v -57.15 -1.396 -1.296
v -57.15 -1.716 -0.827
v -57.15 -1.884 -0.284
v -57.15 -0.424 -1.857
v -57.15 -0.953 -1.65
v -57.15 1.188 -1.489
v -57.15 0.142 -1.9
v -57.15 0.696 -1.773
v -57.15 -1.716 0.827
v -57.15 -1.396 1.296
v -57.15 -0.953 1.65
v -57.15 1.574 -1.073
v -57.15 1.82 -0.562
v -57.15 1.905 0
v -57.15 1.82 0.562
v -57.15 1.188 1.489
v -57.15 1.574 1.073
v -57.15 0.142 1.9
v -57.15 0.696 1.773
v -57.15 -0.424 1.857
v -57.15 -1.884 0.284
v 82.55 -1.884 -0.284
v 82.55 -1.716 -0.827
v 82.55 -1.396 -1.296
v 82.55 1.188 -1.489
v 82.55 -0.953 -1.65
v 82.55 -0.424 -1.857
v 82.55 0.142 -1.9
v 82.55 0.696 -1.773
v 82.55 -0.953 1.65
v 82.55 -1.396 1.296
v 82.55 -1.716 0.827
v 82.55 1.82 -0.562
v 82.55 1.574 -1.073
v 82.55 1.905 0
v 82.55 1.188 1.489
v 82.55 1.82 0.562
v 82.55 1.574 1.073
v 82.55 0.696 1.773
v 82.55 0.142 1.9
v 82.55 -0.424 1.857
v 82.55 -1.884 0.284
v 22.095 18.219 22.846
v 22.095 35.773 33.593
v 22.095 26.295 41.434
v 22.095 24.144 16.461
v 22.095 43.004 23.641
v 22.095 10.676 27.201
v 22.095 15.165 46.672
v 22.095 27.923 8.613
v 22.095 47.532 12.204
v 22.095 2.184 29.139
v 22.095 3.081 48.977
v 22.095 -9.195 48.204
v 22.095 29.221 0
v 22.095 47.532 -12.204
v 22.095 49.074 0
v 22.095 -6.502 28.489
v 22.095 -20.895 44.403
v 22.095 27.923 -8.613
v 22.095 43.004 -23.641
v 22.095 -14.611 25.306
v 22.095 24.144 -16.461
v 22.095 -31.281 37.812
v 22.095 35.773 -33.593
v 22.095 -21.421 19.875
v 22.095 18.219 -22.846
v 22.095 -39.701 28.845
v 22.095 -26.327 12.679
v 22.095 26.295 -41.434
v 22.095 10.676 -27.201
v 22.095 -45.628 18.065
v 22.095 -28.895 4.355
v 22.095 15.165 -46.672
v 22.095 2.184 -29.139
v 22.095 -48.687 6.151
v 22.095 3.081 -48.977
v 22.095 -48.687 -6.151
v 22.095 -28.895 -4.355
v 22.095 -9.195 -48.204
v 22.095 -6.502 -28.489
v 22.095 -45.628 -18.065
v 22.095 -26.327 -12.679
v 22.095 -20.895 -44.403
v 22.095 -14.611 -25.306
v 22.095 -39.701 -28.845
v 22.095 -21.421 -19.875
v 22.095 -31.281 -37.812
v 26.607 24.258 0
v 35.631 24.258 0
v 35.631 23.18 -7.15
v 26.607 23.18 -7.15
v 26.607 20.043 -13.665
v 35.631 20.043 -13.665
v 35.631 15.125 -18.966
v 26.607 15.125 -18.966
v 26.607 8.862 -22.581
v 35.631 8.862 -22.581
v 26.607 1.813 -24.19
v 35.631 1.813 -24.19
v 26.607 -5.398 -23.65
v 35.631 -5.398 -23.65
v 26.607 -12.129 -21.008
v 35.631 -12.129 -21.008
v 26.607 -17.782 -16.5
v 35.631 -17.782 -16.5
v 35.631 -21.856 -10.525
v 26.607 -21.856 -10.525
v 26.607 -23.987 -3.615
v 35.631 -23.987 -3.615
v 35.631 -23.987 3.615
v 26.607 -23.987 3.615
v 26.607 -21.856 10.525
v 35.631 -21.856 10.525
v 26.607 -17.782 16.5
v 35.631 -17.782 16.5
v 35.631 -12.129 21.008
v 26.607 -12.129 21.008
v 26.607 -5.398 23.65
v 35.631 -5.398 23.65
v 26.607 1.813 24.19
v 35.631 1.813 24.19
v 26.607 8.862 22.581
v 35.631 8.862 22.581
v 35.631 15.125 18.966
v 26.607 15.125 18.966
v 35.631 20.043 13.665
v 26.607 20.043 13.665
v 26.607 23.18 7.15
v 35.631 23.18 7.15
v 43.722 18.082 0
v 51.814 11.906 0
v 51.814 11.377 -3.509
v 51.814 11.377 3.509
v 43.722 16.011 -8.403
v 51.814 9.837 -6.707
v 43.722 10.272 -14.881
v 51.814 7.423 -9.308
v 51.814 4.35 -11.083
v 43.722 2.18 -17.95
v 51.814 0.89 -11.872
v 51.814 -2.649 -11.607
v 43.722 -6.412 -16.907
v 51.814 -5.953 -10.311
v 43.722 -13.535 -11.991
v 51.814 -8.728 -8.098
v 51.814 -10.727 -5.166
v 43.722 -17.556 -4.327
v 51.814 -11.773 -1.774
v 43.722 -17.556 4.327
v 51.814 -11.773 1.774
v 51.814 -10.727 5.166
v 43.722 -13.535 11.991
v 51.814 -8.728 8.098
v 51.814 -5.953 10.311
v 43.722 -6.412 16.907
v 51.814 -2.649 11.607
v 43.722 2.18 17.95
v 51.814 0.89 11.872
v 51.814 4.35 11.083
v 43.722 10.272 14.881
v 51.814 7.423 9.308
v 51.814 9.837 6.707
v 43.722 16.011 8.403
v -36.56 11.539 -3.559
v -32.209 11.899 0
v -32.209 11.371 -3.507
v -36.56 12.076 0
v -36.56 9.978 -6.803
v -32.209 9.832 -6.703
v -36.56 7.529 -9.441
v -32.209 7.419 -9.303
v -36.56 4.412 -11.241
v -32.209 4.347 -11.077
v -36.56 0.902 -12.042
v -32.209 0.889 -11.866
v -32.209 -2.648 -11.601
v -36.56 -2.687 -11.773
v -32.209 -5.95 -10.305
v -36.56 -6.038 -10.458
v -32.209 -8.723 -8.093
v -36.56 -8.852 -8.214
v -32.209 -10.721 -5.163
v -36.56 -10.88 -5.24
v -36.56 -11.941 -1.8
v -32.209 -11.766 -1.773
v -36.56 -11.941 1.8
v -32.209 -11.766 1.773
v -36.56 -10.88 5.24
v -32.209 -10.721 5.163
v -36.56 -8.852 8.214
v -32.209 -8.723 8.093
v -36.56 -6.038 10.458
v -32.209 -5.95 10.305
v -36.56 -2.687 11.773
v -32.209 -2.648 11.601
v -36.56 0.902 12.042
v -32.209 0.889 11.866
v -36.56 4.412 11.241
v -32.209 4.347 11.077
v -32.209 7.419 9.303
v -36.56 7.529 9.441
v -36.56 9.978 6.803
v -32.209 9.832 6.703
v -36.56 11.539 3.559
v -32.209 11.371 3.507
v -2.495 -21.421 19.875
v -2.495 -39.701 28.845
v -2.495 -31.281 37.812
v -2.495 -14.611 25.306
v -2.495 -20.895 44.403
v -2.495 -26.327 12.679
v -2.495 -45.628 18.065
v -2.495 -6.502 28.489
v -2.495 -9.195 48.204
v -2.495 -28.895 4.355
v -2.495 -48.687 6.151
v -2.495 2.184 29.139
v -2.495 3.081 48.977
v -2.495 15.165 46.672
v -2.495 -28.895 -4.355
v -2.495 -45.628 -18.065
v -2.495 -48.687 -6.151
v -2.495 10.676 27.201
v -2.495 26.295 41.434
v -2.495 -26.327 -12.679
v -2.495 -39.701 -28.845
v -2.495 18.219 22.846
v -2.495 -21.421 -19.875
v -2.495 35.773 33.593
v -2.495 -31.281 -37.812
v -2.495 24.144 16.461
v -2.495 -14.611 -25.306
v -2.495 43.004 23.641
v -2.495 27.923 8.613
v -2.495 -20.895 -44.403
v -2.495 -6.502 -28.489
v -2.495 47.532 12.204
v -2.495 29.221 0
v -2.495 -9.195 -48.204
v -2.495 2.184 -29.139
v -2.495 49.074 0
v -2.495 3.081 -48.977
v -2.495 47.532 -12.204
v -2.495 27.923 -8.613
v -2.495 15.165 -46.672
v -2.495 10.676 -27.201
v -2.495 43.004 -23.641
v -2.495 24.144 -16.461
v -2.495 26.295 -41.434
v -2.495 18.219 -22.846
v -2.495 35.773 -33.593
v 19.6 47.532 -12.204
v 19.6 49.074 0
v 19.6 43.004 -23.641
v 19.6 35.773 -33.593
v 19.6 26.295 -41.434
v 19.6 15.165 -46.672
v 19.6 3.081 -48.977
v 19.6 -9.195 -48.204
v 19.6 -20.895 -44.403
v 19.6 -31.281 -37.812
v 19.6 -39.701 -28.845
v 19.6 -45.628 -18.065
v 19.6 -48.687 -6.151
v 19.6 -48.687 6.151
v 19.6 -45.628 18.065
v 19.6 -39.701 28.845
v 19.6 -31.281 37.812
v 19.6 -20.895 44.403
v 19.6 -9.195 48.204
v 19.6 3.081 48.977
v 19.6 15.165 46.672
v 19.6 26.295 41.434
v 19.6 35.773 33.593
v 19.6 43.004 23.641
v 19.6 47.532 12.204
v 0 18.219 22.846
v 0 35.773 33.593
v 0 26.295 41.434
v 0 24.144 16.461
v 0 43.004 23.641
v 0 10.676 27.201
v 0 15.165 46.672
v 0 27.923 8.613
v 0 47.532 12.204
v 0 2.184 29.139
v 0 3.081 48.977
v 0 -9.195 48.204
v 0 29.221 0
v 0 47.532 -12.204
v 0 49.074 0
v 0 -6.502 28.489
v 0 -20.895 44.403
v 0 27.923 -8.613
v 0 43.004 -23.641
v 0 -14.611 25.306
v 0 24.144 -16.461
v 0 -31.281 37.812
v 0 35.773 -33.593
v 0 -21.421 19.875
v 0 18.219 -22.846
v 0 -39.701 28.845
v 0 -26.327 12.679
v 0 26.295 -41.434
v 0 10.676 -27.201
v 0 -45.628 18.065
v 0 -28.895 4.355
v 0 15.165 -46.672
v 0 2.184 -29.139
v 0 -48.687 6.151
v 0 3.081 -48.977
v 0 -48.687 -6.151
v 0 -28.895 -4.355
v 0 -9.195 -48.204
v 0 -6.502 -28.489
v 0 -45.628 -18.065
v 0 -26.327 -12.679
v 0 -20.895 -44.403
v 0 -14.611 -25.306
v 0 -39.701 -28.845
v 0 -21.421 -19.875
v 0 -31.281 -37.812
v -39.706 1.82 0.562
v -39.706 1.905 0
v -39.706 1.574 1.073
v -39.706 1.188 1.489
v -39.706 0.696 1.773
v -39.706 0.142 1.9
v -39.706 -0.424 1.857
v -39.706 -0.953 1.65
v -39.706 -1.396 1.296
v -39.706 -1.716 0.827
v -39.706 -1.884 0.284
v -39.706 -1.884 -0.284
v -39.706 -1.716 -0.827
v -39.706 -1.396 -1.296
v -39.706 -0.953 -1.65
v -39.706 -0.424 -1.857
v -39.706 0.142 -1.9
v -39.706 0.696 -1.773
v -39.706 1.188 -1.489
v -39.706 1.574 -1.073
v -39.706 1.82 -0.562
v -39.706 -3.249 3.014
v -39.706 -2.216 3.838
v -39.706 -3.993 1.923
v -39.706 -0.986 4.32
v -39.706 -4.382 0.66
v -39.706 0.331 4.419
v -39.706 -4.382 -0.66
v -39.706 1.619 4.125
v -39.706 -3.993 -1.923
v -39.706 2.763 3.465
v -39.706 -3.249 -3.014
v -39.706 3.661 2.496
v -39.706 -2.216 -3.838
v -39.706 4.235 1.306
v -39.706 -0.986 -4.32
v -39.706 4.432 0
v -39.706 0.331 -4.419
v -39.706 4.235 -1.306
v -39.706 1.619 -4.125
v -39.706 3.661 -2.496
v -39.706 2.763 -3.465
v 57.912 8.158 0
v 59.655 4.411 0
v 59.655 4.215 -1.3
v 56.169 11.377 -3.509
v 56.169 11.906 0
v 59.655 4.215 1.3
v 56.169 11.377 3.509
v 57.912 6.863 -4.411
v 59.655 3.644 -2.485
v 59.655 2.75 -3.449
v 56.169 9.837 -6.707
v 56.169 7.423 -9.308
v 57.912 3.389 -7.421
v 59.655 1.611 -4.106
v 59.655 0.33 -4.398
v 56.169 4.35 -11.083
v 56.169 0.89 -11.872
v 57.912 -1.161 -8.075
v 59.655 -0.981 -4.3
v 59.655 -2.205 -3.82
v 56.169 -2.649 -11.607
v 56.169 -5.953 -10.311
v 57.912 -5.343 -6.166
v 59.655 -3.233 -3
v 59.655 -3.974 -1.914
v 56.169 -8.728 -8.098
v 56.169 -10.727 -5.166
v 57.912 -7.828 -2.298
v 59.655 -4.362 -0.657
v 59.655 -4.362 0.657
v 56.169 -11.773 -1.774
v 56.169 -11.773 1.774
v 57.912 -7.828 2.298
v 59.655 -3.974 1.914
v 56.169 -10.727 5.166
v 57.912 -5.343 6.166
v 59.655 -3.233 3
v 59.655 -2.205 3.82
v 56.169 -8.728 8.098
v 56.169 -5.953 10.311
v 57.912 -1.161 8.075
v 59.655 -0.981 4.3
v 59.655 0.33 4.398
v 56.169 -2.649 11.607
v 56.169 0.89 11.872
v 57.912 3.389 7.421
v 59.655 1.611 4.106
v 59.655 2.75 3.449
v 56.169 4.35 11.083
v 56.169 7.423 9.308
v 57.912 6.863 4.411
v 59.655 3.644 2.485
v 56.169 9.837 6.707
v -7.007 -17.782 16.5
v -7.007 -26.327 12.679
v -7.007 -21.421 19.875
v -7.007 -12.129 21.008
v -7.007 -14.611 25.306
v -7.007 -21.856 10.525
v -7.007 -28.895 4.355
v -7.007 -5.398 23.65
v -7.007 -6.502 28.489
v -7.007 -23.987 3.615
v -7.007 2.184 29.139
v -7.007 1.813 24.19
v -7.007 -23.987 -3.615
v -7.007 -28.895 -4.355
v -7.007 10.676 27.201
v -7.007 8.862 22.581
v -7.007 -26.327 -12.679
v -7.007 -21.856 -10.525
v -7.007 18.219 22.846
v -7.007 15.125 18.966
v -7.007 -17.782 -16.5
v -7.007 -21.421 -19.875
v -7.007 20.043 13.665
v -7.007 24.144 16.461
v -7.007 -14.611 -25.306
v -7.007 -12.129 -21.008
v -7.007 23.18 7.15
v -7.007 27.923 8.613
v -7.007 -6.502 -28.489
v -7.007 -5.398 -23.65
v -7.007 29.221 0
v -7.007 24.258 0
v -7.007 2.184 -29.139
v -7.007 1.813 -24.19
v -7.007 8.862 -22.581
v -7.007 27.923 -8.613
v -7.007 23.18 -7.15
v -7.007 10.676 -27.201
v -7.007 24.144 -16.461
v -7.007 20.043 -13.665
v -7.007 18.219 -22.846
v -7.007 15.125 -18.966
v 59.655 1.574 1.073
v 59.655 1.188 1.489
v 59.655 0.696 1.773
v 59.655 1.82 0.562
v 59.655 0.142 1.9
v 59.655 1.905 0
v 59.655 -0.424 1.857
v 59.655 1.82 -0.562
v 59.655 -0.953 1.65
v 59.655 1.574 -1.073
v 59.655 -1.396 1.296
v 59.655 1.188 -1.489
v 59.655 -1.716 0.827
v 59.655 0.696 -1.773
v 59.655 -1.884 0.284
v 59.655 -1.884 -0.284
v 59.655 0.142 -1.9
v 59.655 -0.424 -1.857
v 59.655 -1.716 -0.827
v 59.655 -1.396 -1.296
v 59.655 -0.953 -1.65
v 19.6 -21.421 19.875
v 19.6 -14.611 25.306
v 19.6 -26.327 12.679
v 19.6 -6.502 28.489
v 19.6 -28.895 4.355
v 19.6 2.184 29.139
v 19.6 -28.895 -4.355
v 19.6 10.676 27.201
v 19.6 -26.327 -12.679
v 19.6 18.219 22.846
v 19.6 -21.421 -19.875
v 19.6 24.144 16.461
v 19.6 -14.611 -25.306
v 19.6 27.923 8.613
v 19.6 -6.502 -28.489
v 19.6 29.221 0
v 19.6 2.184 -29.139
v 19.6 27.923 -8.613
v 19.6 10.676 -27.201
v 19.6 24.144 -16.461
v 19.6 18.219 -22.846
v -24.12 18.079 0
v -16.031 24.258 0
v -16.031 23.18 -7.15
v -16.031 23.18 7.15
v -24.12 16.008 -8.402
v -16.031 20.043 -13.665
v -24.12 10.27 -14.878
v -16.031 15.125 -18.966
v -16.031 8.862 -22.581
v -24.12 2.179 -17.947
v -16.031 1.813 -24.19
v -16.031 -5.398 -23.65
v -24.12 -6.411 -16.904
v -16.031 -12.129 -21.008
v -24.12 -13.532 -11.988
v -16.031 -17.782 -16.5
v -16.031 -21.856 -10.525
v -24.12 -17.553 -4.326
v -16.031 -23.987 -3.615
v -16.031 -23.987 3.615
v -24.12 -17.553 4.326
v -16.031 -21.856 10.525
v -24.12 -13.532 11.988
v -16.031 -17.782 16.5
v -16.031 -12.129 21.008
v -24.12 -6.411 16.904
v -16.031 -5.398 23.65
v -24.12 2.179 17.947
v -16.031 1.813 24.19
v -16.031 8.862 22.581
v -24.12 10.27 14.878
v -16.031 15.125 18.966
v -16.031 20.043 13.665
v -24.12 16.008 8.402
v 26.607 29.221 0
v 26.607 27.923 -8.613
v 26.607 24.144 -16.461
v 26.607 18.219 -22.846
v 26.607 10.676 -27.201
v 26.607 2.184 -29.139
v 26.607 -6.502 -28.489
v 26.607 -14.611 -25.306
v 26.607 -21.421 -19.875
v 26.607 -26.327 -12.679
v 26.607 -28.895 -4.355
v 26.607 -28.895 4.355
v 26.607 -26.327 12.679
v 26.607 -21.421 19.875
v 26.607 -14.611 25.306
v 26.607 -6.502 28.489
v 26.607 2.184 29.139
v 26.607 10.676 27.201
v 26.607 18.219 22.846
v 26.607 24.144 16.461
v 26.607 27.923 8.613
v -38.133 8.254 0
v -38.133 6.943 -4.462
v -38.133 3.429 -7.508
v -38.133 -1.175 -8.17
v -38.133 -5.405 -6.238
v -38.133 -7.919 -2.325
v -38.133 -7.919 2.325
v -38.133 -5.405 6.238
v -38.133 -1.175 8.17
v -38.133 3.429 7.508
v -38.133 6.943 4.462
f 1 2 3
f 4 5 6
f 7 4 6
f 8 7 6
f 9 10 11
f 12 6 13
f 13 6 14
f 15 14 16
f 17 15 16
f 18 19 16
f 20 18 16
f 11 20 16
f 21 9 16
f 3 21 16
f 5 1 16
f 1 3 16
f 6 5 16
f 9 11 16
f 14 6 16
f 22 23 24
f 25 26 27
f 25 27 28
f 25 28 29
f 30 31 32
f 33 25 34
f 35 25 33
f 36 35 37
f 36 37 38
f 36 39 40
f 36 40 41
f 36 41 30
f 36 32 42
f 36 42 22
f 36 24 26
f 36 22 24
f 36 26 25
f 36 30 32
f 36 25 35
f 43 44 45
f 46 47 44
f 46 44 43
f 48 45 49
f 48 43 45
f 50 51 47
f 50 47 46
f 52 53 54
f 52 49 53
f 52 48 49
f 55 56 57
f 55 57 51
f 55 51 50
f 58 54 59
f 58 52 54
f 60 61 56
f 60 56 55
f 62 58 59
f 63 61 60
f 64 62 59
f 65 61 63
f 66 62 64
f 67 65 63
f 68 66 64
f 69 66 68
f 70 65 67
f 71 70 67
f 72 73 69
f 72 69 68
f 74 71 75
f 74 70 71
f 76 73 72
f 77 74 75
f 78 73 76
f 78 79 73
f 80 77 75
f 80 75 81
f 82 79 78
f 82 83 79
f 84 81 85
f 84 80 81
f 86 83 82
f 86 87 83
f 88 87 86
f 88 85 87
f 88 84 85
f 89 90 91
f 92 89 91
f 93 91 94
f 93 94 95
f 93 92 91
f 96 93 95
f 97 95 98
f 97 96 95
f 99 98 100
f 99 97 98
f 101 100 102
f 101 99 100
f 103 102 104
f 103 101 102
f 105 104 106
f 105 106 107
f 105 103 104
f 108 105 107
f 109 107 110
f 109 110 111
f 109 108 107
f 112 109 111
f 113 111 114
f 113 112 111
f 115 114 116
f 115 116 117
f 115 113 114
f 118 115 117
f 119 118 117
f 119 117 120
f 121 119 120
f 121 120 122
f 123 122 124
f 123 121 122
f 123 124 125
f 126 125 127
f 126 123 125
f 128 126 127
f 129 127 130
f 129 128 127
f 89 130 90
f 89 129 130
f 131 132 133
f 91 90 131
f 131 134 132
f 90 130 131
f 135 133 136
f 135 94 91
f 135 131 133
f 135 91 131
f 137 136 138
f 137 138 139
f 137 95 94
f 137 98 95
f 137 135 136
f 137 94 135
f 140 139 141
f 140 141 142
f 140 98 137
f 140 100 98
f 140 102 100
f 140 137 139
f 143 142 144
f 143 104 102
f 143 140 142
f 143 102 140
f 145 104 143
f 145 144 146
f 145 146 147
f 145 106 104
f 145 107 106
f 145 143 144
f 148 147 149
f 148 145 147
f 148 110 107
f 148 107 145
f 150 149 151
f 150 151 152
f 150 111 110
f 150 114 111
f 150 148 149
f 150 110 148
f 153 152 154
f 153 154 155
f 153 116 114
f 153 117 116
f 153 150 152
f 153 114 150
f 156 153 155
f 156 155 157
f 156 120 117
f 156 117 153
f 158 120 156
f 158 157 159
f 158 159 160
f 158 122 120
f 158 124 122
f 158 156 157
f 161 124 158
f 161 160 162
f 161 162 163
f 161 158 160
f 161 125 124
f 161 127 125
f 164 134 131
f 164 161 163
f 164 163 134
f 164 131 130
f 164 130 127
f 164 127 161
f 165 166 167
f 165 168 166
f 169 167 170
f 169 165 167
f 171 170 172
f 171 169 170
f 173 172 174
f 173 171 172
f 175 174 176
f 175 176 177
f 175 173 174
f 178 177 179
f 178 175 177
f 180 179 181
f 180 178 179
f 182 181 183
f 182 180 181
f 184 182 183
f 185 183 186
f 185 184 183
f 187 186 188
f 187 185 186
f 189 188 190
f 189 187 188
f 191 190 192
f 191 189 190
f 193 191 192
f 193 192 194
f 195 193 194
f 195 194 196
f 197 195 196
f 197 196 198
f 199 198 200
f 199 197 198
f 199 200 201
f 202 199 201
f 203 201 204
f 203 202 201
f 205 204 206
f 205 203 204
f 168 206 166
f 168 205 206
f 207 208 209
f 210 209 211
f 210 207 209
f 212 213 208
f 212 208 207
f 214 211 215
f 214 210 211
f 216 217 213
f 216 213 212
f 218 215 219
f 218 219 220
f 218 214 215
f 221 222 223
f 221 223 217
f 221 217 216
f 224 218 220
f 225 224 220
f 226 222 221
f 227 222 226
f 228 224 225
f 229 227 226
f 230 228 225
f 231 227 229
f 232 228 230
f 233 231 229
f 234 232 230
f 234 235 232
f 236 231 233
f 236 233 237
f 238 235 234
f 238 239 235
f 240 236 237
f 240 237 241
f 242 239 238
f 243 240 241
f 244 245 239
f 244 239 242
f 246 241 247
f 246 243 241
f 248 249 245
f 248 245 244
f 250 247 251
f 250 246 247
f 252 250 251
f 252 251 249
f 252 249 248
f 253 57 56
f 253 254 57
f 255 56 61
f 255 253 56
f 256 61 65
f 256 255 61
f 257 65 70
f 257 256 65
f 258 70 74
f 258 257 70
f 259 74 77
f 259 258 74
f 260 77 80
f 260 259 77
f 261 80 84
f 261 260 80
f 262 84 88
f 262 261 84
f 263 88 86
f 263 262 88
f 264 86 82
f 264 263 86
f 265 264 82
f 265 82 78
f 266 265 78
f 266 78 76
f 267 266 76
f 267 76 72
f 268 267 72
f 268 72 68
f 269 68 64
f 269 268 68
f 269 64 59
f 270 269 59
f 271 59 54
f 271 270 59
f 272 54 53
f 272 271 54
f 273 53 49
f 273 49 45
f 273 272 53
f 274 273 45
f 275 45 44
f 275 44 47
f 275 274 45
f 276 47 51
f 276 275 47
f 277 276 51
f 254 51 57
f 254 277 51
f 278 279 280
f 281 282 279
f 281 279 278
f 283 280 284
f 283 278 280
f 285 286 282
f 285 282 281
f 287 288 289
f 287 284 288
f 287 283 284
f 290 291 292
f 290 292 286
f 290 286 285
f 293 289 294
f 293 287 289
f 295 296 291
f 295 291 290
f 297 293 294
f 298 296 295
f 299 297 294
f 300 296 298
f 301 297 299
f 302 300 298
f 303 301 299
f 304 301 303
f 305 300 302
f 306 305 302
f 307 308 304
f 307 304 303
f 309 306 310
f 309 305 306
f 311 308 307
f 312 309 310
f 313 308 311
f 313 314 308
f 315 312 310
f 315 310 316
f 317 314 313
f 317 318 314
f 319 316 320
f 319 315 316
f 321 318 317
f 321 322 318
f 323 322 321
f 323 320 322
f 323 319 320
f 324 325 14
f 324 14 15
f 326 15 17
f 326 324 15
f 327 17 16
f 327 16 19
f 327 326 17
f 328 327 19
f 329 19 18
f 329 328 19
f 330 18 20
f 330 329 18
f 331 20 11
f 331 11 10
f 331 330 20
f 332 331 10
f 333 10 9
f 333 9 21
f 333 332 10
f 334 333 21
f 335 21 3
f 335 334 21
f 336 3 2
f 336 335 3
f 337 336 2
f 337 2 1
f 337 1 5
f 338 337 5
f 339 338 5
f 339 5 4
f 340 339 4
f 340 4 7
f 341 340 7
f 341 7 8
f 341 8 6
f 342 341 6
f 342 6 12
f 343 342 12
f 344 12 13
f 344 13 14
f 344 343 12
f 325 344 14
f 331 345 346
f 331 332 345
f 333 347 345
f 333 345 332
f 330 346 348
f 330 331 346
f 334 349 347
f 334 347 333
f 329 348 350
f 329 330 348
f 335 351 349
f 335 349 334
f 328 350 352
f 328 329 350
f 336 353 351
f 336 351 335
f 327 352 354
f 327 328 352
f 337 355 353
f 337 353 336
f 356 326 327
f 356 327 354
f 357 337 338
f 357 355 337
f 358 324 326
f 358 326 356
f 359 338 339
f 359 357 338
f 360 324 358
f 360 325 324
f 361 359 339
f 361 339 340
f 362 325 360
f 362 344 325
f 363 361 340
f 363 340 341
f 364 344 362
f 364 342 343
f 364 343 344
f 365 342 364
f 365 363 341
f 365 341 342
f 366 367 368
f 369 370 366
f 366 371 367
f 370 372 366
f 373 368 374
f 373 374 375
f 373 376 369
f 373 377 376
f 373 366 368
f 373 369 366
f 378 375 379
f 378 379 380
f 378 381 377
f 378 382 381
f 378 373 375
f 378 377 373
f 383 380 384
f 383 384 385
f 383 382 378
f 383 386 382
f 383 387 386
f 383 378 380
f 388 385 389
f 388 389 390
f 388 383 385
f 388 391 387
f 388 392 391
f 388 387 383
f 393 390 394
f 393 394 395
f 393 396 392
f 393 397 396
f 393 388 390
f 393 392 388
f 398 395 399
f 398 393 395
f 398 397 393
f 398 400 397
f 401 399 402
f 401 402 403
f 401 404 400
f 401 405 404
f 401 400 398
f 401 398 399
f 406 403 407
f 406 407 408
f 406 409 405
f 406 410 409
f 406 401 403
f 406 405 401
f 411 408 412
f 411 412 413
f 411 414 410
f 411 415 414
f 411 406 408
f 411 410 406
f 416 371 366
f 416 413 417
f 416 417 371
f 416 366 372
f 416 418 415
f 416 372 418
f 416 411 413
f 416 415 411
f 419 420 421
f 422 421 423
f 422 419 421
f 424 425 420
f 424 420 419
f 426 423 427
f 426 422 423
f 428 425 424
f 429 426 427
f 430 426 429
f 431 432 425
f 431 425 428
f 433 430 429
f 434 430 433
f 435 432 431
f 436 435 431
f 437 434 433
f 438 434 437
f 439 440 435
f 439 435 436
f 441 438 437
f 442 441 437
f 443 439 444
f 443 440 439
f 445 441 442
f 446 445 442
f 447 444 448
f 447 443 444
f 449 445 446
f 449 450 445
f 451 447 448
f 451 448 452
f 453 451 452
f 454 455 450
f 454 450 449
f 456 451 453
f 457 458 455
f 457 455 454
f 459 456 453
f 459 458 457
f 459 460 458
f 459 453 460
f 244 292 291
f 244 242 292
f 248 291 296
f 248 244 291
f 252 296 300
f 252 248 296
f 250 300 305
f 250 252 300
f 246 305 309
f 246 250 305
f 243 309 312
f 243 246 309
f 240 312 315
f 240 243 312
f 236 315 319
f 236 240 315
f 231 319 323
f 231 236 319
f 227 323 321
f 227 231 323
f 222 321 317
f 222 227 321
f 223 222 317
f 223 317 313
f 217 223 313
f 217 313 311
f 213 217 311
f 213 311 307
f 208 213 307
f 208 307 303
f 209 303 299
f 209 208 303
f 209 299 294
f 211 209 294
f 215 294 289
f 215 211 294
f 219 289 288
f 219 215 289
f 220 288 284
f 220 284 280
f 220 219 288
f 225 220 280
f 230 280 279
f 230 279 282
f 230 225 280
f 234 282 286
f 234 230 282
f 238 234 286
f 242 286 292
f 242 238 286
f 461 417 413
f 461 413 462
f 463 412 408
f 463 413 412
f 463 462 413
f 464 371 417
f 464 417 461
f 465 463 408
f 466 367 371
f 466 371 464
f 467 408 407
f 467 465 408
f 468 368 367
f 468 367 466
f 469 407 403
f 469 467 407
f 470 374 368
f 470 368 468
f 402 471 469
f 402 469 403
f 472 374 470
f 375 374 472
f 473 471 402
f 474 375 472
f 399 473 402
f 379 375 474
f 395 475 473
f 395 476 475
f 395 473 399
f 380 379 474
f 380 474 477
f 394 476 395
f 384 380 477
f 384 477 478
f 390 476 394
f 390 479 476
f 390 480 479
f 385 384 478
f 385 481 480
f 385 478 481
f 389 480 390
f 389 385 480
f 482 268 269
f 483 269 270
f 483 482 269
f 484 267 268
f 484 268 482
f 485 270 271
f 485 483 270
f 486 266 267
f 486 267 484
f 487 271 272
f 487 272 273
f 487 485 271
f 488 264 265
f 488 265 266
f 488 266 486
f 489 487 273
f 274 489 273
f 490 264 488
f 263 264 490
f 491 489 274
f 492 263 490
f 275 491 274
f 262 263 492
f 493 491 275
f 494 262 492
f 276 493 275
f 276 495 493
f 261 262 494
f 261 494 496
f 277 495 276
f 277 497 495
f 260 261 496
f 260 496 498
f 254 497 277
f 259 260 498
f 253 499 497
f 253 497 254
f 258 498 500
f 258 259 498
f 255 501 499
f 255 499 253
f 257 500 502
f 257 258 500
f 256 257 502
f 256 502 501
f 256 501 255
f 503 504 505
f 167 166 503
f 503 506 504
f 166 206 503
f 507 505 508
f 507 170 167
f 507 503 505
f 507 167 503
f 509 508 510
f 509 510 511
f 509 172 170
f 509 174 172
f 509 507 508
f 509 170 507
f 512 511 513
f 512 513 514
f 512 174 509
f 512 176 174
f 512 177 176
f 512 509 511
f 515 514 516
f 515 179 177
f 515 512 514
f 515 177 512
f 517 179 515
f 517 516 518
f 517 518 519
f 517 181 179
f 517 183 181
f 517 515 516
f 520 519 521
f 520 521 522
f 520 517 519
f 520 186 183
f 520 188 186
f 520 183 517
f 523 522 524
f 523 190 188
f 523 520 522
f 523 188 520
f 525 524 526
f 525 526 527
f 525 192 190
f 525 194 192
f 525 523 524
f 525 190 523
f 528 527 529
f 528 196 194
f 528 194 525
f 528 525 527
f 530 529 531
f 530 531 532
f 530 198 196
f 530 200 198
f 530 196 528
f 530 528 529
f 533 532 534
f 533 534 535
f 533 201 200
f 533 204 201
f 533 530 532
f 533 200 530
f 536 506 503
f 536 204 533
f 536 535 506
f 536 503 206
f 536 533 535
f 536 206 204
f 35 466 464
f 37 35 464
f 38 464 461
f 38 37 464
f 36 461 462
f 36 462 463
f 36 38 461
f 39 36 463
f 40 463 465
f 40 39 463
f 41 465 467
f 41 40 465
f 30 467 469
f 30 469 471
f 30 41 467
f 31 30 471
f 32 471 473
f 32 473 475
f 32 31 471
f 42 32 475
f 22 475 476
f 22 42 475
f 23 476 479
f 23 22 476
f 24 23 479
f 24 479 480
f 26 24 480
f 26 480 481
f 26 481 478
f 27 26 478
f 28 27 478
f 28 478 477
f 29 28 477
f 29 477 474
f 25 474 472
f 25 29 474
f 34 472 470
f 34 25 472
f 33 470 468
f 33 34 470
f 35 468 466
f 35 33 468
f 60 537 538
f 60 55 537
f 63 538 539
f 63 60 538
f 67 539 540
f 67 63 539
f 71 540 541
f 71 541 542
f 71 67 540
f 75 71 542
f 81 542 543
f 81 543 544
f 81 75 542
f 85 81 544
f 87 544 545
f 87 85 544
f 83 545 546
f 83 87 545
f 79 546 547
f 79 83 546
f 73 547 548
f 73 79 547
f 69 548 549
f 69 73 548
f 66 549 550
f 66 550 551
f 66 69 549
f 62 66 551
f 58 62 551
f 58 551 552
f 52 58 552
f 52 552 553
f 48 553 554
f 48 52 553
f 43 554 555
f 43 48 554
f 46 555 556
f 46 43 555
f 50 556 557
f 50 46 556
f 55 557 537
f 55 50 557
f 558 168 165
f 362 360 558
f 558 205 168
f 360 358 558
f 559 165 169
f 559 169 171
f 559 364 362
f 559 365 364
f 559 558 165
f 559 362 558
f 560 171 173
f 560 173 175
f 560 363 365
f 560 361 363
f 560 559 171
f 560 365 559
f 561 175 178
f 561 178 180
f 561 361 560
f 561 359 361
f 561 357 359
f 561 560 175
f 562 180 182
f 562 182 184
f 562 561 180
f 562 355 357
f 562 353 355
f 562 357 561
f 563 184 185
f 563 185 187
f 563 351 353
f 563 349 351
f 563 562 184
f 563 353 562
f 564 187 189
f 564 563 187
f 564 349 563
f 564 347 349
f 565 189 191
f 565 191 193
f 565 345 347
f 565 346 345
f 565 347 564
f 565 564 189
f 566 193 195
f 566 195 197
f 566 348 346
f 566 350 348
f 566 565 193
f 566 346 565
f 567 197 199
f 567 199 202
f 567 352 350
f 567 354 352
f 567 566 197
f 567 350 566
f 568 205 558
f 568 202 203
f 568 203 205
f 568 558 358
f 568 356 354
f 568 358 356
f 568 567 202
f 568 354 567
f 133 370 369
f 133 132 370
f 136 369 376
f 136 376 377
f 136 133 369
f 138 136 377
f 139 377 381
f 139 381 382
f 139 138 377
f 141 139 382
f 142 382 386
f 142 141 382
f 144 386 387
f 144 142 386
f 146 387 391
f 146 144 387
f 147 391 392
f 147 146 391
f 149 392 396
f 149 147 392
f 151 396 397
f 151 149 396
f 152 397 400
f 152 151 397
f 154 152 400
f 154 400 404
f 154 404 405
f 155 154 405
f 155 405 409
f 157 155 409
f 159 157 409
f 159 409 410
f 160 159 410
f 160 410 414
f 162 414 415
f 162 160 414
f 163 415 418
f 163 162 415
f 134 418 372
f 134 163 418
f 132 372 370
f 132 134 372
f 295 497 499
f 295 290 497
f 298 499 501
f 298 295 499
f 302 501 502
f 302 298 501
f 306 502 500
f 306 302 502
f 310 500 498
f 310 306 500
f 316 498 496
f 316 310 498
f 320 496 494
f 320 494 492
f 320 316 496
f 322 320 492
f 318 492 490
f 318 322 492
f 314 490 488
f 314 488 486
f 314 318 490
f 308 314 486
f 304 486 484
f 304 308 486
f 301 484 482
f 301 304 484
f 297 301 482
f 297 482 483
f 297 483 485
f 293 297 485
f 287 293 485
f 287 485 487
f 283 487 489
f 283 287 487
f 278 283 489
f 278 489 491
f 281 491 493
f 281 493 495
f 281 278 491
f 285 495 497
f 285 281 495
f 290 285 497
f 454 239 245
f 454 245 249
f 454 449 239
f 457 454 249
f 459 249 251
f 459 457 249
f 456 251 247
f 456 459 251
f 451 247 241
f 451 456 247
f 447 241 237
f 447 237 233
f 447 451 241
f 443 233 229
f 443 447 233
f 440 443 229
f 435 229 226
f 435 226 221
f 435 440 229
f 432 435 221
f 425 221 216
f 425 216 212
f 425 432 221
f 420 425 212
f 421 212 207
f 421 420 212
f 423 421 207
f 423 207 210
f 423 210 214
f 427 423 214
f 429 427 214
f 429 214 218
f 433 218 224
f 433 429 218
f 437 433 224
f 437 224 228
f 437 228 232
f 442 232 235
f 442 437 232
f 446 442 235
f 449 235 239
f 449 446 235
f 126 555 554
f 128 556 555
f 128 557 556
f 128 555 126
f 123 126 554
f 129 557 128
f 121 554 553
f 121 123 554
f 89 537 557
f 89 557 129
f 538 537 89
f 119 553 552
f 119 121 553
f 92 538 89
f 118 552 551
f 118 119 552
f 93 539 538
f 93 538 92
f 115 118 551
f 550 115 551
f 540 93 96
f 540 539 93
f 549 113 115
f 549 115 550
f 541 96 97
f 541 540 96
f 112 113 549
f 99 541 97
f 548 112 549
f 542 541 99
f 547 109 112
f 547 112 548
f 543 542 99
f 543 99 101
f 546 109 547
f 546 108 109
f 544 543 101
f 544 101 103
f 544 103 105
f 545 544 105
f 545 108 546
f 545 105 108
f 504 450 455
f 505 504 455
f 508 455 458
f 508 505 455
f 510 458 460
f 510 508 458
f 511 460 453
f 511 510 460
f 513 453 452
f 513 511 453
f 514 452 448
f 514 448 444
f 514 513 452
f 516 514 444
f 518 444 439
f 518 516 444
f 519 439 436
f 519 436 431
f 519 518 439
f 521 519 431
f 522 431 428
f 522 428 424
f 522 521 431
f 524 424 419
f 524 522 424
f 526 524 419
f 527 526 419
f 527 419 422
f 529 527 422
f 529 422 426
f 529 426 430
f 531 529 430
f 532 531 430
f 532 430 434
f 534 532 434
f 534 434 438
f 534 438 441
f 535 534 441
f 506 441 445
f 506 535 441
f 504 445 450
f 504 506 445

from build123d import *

# Parameters (mm, degrees)
F1_R          = 1.905
F2_DEPTH      = 82.55
F2_DEPTH_BACK = 57.15
F3_DEPTH      = 0.762


with BuildPart() as f2:
    # F1 (on Right) → F2 (new body, two sides)
    with BuildSketch(Plane.YZ) as f2_sk:
        Circle(F1_R)
    extrude(amount=F2_DEPTH)
    extrude(f2_sk.sketch, amount=-F2_DEPTH_BACK)

    # F1 (on Right) → F3 (join)
    with BuildSketch(Plane.YZ):
        Circle(F1_R)
    extrude(amount=F3_DEPTH)

    # F0 (on Top) → F4 (revolve)
    with BuildSketch(Plane.XY):
        Polygon((-7.007087, 24.25808), (-16.030946, 24.25808), (-32.2088, 11.899154), (-36.560226, 12.075871), (-39.70601, 4.431527), (-39.70601, 0), (-35.594656, 0), (59.655344, 0), (59.655344, 4.410799), (56.168538, 11.90574), (51.813526, 11.90574), (35.630643, 24.25808), (26.606784, 24.25808), (26.606784, 29.221201), (22.094855, 29.221201), (22.094855, 49.07369), (19.599697, 49.07369), (19.599697, 29.221201), (0, 29.221201), (0, 49.07369), (-2.495158, 49.07369), (-2.495158, 29.221201), (-7.007087, 29.221201), align=None)
    revolve(axis=Axis((0, 0, 0), (-1, 0, 0)))


solid = f2.part
